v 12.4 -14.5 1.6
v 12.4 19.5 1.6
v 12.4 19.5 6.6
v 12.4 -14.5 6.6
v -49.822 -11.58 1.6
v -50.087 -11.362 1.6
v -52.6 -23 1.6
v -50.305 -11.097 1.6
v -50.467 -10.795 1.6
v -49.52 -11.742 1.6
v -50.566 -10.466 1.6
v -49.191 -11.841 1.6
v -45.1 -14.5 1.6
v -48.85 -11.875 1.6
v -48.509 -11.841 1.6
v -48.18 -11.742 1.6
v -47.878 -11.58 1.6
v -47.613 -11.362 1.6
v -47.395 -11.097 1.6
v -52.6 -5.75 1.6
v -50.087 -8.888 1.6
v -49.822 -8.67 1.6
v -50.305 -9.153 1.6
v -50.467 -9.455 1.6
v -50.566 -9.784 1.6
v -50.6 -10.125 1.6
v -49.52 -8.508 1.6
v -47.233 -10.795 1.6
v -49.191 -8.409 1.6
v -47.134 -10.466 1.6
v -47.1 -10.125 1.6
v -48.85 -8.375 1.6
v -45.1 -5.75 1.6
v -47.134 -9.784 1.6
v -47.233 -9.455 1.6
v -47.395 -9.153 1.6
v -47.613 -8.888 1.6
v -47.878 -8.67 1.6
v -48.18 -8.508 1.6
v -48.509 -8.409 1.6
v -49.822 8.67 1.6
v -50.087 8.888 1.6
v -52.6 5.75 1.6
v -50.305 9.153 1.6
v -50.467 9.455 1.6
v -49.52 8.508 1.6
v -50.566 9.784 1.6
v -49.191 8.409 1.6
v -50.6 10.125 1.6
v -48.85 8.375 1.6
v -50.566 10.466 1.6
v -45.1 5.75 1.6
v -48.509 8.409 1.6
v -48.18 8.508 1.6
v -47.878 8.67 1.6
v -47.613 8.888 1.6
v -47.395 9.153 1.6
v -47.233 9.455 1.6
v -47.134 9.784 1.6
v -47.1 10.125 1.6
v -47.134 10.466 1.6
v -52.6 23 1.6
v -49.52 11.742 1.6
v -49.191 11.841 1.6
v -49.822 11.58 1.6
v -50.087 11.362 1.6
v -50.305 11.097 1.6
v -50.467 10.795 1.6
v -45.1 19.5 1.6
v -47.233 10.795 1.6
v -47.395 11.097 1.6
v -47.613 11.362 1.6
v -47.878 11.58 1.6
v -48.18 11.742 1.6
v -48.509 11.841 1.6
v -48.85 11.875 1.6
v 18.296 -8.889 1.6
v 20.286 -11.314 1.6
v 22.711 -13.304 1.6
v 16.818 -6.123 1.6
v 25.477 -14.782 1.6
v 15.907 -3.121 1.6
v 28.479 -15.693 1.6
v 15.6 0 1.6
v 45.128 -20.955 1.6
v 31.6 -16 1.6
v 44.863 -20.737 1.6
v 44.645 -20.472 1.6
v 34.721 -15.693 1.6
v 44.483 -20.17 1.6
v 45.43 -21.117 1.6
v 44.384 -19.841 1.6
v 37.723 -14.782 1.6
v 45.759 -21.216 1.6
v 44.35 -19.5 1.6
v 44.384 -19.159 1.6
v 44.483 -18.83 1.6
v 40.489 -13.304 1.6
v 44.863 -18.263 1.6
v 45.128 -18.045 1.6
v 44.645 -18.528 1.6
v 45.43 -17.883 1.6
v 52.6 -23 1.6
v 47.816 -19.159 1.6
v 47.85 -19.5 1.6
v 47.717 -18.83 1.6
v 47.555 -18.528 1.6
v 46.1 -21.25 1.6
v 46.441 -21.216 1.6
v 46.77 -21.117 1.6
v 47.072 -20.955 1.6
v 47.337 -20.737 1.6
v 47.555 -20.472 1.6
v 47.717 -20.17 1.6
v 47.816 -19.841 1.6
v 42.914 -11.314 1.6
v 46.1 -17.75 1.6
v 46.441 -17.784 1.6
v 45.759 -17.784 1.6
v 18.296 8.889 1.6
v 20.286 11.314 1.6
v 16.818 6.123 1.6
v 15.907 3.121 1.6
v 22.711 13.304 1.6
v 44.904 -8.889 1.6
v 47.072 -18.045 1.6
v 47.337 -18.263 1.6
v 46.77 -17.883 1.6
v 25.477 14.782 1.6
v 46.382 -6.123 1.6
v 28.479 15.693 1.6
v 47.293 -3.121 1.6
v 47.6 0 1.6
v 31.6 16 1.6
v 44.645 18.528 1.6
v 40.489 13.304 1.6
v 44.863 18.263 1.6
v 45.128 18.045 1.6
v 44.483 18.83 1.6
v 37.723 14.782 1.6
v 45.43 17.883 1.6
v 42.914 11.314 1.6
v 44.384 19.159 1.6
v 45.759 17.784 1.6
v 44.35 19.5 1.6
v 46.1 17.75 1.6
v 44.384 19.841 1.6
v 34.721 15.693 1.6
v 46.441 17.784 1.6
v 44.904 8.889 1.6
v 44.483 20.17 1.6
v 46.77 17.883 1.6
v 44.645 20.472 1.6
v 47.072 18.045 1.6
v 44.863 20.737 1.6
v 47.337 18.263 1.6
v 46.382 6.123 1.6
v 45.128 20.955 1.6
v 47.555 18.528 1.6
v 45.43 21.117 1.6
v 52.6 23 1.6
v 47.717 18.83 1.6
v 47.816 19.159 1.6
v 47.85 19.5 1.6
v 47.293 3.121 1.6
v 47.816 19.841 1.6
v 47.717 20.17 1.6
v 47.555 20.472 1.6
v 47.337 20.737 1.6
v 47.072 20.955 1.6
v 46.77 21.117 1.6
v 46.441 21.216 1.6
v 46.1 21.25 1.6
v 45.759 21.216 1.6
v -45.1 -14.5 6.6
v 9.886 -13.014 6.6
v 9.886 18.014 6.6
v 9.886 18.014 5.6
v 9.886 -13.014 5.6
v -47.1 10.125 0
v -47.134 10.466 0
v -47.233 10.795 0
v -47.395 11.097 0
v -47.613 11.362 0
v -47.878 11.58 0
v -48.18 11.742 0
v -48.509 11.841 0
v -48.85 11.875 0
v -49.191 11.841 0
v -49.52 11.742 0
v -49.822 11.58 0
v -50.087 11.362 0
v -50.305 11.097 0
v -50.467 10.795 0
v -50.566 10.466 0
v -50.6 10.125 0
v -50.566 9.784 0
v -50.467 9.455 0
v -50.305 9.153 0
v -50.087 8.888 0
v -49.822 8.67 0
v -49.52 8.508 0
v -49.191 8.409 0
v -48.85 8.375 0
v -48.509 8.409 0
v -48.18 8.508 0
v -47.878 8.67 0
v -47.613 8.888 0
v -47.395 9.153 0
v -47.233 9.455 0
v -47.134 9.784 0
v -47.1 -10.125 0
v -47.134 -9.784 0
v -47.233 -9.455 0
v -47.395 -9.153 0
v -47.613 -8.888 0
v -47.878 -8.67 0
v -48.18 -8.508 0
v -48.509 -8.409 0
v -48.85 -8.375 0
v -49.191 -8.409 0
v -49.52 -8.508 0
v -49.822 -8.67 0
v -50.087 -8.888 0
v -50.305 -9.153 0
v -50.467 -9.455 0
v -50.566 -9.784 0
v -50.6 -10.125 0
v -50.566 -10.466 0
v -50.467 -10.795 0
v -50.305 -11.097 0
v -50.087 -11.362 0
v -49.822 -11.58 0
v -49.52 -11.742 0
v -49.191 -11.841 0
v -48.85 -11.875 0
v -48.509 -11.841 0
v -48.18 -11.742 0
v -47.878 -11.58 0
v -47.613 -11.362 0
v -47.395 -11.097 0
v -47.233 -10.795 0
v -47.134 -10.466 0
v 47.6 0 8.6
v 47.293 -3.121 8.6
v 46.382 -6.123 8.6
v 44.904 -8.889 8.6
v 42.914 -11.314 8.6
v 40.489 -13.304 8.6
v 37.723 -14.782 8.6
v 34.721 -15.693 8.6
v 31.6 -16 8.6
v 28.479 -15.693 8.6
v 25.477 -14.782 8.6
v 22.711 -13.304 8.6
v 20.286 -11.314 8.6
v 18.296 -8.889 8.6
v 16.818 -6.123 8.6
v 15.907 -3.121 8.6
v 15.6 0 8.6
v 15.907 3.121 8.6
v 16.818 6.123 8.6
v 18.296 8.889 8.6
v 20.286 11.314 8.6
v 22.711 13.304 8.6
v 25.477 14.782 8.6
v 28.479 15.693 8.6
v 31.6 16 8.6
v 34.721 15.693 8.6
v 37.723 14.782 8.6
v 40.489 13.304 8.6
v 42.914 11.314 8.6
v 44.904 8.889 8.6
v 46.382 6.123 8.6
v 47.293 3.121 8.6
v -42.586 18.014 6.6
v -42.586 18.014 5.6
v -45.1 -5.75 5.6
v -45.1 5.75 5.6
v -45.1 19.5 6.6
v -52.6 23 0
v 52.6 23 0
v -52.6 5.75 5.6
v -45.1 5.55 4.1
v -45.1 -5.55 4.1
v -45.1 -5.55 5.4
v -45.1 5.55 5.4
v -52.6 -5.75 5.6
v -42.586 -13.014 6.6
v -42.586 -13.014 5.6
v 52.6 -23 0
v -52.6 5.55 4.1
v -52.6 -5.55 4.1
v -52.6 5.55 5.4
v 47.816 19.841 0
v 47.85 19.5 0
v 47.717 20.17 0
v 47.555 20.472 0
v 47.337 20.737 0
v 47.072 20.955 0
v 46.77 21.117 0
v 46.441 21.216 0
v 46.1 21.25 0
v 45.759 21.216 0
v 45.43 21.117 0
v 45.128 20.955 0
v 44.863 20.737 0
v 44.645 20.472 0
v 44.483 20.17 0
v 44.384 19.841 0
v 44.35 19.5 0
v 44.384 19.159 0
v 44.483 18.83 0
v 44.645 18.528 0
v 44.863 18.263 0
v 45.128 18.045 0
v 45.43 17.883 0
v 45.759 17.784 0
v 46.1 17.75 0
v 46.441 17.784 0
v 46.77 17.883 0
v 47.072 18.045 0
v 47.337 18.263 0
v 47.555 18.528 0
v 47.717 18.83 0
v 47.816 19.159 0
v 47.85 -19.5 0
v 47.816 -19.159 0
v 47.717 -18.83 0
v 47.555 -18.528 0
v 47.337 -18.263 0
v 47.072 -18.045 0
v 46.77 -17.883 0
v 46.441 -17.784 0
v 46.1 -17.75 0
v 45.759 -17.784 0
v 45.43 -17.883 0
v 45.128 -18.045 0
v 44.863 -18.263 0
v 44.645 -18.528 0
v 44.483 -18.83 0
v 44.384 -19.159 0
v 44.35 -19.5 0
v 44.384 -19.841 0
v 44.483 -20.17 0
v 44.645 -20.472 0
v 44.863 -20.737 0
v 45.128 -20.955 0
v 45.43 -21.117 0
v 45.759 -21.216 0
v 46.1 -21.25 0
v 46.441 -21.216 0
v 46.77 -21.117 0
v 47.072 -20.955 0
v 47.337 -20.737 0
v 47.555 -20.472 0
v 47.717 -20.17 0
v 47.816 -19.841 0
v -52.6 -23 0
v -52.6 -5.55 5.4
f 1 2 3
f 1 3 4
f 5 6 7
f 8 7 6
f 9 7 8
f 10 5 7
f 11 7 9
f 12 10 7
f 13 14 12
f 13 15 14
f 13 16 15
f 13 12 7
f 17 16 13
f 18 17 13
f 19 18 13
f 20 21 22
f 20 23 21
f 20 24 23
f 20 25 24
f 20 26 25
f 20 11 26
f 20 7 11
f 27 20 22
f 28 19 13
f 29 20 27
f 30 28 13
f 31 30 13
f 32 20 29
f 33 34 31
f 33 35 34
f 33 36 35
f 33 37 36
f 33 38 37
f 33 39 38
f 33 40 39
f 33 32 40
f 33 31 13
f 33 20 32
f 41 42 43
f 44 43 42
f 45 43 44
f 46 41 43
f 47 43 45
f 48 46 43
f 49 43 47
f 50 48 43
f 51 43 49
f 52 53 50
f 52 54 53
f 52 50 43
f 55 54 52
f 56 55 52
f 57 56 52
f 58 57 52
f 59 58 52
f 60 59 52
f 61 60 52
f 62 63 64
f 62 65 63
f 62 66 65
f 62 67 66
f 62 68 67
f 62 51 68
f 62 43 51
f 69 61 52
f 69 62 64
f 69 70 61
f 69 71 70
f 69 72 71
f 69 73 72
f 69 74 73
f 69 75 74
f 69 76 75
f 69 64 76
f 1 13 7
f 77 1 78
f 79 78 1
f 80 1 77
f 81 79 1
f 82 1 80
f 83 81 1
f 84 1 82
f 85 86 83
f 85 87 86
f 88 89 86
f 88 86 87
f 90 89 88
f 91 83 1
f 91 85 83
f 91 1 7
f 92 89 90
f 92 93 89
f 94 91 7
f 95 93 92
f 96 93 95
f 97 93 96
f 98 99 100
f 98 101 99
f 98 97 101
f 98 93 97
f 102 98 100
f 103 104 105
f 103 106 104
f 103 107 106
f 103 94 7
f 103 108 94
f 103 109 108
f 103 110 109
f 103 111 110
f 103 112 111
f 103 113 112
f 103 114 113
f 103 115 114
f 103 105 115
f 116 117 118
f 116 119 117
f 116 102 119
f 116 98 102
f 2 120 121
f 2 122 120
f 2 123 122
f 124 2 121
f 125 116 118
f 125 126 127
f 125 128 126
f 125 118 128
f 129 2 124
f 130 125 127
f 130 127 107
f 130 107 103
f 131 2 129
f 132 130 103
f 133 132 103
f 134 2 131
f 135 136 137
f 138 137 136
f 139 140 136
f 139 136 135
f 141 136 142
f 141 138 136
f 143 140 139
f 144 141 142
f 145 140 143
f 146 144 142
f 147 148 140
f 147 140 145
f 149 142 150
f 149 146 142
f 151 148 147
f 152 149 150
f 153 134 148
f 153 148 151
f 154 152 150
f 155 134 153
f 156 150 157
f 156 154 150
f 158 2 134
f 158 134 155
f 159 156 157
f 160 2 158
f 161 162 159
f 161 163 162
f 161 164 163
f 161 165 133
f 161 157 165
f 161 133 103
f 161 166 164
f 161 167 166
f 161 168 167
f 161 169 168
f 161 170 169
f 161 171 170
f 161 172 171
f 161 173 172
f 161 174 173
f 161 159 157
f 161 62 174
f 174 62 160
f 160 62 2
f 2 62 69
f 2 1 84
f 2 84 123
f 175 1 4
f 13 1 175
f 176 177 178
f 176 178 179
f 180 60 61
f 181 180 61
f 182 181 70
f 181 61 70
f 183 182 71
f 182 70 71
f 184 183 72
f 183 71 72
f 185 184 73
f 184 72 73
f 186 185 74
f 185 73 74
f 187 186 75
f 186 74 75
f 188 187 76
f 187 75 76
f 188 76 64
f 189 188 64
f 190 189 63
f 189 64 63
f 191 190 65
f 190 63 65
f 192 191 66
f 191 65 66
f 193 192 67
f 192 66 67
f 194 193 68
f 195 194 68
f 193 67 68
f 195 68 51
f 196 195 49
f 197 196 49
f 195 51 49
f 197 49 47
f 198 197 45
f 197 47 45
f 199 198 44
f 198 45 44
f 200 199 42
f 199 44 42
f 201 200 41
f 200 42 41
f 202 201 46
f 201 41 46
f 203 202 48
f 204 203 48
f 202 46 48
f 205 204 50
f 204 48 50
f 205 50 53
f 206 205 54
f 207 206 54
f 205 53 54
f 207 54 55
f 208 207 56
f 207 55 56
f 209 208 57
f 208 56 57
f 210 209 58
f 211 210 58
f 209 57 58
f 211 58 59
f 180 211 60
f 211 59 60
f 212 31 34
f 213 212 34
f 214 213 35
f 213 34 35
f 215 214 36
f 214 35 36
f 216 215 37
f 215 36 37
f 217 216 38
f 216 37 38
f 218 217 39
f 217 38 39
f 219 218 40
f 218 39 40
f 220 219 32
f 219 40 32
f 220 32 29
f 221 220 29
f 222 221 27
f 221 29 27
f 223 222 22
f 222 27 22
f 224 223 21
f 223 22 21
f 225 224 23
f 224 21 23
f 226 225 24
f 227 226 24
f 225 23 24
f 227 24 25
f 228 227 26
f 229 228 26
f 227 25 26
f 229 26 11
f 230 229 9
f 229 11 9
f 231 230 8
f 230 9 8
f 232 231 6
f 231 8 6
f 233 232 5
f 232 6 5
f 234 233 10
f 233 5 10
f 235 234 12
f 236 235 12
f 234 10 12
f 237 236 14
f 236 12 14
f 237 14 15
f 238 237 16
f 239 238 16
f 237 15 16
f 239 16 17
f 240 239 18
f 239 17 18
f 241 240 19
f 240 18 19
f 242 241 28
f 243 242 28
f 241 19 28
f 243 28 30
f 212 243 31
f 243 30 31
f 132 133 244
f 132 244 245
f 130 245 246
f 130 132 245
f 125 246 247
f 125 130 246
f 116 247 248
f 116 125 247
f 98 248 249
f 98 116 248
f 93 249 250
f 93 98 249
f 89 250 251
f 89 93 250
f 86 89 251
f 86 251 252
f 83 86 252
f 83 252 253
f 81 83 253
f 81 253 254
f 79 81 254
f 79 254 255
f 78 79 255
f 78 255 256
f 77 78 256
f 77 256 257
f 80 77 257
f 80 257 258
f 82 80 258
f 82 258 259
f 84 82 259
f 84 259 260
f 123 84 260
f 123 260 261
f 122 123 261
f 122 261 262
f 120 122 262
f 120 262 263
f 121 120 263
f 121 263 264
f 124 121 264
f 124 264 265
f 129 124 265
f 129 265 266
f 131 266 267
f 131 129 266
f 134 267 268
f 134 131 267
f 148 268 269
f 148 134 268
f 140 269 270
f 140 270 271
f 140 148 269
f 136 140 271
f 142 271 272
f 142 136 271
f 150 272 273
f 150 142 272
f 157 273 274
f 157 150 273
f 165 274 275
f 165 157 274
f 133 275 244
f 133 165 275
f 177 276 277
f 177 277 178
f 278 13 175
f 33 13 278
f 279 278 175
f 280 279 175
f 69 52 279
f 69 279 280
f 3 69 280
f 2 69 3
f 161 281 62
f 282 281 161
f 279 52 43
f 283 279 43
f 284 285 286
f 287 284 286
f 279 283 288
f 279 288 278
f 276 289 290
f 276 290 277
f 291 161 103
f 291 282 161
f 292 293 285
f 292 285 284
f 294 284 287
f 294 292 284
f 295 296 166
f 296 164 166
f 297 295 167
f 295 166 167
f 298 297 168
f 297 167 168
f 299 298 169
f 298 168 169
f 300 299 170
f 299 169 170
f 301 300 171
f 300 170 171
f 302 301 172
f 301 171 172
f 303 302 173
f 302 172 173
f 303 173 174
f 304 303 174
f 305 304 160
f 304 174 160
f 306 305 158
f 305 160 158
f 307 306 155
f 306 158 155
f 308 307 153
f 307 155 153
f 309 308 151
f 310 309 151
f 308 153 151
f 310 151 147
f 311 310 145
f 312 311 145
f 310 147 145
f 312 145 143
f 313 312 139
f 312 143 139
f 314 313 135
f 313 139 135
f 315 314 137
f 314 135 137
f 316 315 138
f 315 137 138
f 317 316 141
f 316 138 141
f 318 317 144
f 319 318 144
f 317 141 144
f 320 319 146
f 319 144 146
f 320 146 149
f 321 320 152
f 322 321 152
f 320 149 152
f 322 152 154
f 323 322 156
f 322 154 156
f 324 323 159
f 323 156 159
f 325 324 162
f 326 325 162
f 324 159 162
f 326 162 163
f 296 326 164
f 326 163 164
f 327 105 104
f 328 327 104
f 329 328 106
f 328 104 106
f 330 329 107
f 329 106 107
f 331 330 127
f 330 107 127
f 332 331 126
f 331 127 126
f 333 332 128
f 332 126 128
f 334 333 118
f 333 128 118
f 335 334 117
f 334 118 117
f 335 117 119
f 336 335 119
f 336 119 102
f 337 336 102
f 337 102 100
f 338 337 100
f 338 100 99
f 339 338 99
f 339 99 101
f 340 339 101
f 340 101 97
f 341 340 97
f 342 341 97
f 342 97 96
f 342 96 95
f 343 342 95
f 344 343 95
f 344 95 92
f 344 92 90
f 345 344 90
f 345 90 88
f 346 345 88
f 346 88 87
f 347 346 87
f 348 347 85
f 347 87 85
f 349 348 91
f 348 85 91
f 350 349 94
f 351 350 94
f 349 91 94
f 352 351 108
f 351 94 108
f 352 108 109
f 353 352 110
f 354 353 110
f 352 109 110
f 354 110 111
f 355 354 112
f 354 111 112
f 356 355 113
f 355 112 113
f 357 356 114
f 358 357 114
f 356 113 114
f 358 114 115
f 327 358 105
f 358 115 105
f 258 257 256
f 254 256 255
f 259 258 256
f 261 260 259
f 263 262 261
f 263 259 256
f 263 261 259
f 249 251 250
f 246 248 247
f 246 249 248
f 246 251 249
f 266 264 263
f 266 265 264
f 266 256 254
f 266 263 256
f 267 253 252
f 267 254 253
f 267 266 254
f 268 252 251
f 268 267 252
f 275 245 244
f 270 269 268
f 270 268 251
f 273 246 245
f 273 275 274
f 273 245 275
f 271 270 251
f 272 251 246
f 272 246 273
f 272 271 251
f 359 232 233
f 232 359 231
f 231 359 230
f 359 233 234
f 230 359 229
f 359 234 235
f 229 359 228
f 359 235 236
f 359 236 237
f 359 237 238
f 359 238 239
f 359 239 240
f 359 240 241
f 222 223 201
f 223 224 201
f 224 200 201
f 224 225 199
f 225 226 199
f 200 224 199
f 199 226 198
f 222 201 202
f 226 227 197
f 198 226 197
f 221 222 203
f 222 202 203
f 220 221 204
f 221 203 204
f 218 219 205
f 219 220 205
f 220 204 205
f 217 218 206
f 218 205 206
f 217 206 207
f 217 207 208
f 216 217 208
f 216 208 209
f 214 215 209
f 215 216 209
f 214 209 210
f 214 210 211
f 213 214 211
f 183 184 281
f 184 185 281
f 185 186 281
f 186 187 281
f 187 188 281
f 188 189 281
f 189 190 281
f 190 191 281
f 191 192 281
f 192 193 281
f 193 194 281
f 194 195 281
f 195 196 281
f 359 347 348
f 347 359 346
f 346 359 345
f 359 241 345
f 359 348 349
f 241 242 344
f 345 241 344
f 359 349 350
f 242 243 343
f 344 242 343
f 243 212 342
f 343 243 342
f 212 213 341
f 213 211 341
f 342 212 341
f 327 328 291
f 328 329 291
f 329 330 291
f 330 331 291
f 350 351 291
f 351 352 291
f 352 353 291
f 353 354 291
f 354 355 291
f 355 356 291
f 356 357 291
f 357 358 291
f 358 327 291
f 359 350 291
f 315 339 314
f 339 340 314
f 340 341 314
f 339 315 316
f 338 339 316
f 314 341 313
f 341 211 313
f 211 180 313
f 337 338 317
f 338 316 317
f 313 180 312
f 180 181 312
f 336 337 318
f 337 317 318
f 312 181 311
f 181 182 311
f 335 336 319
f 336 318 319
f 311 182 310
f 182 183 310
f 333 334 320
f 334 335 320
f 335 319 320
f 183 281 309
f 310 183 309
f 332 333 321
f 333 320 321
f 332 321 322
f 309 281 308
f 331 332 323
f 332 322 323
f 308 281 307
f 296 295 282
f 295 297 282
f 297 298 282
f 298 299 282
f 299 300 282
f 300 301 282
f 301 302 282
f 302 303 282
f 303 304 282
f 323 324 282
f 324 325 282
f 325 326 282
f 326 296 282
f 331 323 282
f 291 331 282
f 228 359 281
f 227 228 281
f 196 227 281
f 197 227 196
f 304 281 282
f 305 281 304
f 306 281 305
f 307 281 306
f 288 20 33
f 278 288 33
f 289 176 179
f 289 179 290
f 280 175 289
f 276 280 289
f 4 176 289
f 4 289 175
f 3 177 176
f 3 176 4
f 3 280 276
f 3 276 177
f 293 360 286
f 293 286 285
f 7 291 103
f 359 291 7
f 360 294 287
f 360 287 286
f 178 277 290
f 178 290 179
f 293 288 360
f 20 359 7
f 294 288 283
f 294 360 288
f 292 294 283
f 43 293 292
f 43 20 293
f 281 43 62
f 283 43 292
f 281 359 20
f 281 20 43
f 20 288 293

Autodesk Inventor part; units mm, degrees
ref_plane "YZ Plane" through (0, 0, 0) normal (1, 0, 0) x (0, 1, 0)
ref_plane "XZ Plane" through (0, 0, 0) normal (0, 1, 0) x (-1, 0, 0)
ref_plane "XY Plane" through (0, 0, 0) normal (0, 0, 1) x (1, 0, 0)
sketch "Sketch1" plane through (0, 0, 0) normal (0, 0, 1) x (1, 0, 0)
  line L0 (-52.6, 23) -> (52.6, 23)
  line L1 (52.6, 23) -> (52.6, -23)
  line L2 (52.6, -23) -> (-52.6, -23)
  line L3 (-52.6, -23) -> (-52.6, 23)
  point P0 (0, 0)
  point P1 (-52.6, 0)
  point P2 (0, 23)
  dimension "d0" = 105.2
  dimension "d2" = 46
extrude "Extrusion1" add sketch "Sketch1" along normal blind 1.6
sketch "Sketch2" plane through (0, 0, 1.6) normal (0, 0, 1) x (1, 0, 0)
  line L0 (-52.6, -23) -> (52.6, -23) projected
  line L1 (52.6, -23) -> (52.6, 23) projected
  line L2 (-45.1, 19.5) -> (12.4, 19.5)
  line L3 (12.4, 19.5) -> (12.4, -14.5)
  line L4 (12.4, -14.5) -> (-45.1, -14.5)
  line L5 (-45.1, -14.5) -> (-45.1, 19.5)
  circle A0 centre (31.6, 0) radius 16
  line L6 (31.6, 0) -> (31.6, -16)
  line L7 (31.6, 0) -> (31.6, 16)
  line L8 (52.6, 23) -> (-52.6, 23) projected
  line L9 (-52.6, 23) -> (-52.6, -23) projected
  point P0 (0, 0)
  dimension "d5" = 57.5
  dimension "d7" = 34
  dimension "d8" = 32
  dimension "d9" = 21
  dimension "d10" = 23
  dimension "d13" = 3.5
  dimension "d14" = 7.5
extrude "Extrusion2" add sketch "Sketch2" along normal blind 7 contours L2 L3 L4 L5 | A0 L6 L7 | L7 L6 A0
sketch "Sketch3" plane through (0, 0, 8.6) normal (0, 0, 1) x (1, 0, 0)
  line L0 (12.4, 19.5) -> (-45.1, 19.5) projected
  line L1 (-45.1, 19.5) -> (-45.1, -14.5) projected
  line L2 (-45.1, -14.5) -> (12.4, -14.5) projected
  line L3 (12.4, -14.5) -> (12.4, 19.5) projected
  point P0 (0, 0)
extrude "Extrusion3" cut sketch "Sketch3" against normal blind 2
sketch "Sketch4" plane through (0, 0, 6.6) normal (0, 0, 1) x (1, 0, 0)
  line L0 (-45.1, 19.5) -> (12.4, 19.5) projected
  line L1 (-45.1, -14.5) -> (-45.1, 19.5) projected
  line L2 (-42.5865, 18.0138) -> (9.8865, 18.0138)
  line L3 (9.8865, 18.0138) -> (9.8865, -13.0138)
  line L4 (9.8865, -13.0138) -> (-42.5865, -13.0138)
  line L5 (-42.5865, -13.0138) -> (-42.5865, 18.0138)
  line L6 (-45.1, -14.5) -> (-42.5865, -13.0138) construction
  point P0 (0, 0)
  point P1 (-45.1, 2.5)
  point P2 (-42.5865, 2.5)
  point P3 (-16.35, 18.0138)
  point P4 (-16.35, 19.5)
  dimension "d21" = 60.96
extrude "Extrusion4" cut sketch "Sketch4" against normal blind 1
sketch "Sketch5" plane through (0, 0, 1.6) normal (0, 0, 1) x (1, 0, 0)
  line L0 (-52.6, 23) -> (-52.6, -23) projected
  line L1 (-52.6, -5.75) -> (-45.1, -5.75)
  line L2 (-45.1, -5.75) -> (-45.1, 5.75)
  line L3 (-45.1, 5.75) -> (-52.6, 5.75)
  line L4 (-52.6, 5.75) -> (-52.6, -5.75)
  line L5 (-45.1, -14.5) -> (-45.1, 19.5) projected
  point P0 (0, 0)
  point P1 (-45.1, 0)
  point P2 (-52.6, 0)
  dimension "d24" = 11.5
extrude "Extrusion5" add sketch "Sketch5" along normal blind 4
sketch "Sketch6" plane through (-52.6, -23, 0) normal (-1, 0, 0) x (0, 0, 1)
  line L0 (1.6, 17.25) -> (5.6, 17.25) projected
  line L1 (5.6, 28.75) -> (5.6, 17.25) projected
  line L2 (1.6, 28.75) -> (5.6, 28.75) projected
  line L3 (1.6, 46) -> (1.6, 28.75) projected
  line L4 (4.1, 28.55) -> (5.4, 28.55)
  line L5 (5.4, 28.55) -> (5.4, 17.45)
  line L6 (5.4, 17.45) -> (4.1, 17.45)
  line L7 (4.1, 17.45) -> (4.1, 28.55)
  point P0 (0, 23)
  dimension "d28" = 2.5
  dimension "d29" = 0.2
  dimension "d30" = 0.2
  dimension "d31" = 0.2
extrude "Extrusion6" cut sketch "Sketch6" against normal up to surface (7.5 mm away)
sketch "Sketch7" plane through (0, 0, 1.6) normal (0, 0, 1) x (1, 0, 0)
  line L0 (52.6, -23) -> (52.6, 23) projected
  line L1 (-52.6, 23) -> (-52.6, 5.75) projected
  line L2 (-45.1, -14.5) -> (-45.1, -5.75) projected
  circle A0 centre (-48.85, -10.125) radius 1.75
  circle A1 centre (-48.85, 10.125) radius 1.75
  circle A2 centre (46.1, 19.5) radius 1.75
  circle A3 centre (46.1, -19.5) radius 1.75
  line L3 (-48.85, 10.125) -> (-48.85, -10.125) construction
  line L4 (46.1, 19.5) -> (46.1, -19.5) construction
  point P0 (0, 0)
  point P1 (52.6, 0)
  point P2 (-48.85, 0)
  point P3 (46.1, 0)
  point P4 (52.6, 0)
  point P5 (52.6, 0)
  dimension "d34" = 20.25
  dimension "d36" = 3.75
  dimension "d37" = 39
  dimension "d39" = 6.5
  dimension "d40" = 3.5
extrude "Extrusion7" cut sketch "Sketch7" against normal through all
properties part number "miniviki"
